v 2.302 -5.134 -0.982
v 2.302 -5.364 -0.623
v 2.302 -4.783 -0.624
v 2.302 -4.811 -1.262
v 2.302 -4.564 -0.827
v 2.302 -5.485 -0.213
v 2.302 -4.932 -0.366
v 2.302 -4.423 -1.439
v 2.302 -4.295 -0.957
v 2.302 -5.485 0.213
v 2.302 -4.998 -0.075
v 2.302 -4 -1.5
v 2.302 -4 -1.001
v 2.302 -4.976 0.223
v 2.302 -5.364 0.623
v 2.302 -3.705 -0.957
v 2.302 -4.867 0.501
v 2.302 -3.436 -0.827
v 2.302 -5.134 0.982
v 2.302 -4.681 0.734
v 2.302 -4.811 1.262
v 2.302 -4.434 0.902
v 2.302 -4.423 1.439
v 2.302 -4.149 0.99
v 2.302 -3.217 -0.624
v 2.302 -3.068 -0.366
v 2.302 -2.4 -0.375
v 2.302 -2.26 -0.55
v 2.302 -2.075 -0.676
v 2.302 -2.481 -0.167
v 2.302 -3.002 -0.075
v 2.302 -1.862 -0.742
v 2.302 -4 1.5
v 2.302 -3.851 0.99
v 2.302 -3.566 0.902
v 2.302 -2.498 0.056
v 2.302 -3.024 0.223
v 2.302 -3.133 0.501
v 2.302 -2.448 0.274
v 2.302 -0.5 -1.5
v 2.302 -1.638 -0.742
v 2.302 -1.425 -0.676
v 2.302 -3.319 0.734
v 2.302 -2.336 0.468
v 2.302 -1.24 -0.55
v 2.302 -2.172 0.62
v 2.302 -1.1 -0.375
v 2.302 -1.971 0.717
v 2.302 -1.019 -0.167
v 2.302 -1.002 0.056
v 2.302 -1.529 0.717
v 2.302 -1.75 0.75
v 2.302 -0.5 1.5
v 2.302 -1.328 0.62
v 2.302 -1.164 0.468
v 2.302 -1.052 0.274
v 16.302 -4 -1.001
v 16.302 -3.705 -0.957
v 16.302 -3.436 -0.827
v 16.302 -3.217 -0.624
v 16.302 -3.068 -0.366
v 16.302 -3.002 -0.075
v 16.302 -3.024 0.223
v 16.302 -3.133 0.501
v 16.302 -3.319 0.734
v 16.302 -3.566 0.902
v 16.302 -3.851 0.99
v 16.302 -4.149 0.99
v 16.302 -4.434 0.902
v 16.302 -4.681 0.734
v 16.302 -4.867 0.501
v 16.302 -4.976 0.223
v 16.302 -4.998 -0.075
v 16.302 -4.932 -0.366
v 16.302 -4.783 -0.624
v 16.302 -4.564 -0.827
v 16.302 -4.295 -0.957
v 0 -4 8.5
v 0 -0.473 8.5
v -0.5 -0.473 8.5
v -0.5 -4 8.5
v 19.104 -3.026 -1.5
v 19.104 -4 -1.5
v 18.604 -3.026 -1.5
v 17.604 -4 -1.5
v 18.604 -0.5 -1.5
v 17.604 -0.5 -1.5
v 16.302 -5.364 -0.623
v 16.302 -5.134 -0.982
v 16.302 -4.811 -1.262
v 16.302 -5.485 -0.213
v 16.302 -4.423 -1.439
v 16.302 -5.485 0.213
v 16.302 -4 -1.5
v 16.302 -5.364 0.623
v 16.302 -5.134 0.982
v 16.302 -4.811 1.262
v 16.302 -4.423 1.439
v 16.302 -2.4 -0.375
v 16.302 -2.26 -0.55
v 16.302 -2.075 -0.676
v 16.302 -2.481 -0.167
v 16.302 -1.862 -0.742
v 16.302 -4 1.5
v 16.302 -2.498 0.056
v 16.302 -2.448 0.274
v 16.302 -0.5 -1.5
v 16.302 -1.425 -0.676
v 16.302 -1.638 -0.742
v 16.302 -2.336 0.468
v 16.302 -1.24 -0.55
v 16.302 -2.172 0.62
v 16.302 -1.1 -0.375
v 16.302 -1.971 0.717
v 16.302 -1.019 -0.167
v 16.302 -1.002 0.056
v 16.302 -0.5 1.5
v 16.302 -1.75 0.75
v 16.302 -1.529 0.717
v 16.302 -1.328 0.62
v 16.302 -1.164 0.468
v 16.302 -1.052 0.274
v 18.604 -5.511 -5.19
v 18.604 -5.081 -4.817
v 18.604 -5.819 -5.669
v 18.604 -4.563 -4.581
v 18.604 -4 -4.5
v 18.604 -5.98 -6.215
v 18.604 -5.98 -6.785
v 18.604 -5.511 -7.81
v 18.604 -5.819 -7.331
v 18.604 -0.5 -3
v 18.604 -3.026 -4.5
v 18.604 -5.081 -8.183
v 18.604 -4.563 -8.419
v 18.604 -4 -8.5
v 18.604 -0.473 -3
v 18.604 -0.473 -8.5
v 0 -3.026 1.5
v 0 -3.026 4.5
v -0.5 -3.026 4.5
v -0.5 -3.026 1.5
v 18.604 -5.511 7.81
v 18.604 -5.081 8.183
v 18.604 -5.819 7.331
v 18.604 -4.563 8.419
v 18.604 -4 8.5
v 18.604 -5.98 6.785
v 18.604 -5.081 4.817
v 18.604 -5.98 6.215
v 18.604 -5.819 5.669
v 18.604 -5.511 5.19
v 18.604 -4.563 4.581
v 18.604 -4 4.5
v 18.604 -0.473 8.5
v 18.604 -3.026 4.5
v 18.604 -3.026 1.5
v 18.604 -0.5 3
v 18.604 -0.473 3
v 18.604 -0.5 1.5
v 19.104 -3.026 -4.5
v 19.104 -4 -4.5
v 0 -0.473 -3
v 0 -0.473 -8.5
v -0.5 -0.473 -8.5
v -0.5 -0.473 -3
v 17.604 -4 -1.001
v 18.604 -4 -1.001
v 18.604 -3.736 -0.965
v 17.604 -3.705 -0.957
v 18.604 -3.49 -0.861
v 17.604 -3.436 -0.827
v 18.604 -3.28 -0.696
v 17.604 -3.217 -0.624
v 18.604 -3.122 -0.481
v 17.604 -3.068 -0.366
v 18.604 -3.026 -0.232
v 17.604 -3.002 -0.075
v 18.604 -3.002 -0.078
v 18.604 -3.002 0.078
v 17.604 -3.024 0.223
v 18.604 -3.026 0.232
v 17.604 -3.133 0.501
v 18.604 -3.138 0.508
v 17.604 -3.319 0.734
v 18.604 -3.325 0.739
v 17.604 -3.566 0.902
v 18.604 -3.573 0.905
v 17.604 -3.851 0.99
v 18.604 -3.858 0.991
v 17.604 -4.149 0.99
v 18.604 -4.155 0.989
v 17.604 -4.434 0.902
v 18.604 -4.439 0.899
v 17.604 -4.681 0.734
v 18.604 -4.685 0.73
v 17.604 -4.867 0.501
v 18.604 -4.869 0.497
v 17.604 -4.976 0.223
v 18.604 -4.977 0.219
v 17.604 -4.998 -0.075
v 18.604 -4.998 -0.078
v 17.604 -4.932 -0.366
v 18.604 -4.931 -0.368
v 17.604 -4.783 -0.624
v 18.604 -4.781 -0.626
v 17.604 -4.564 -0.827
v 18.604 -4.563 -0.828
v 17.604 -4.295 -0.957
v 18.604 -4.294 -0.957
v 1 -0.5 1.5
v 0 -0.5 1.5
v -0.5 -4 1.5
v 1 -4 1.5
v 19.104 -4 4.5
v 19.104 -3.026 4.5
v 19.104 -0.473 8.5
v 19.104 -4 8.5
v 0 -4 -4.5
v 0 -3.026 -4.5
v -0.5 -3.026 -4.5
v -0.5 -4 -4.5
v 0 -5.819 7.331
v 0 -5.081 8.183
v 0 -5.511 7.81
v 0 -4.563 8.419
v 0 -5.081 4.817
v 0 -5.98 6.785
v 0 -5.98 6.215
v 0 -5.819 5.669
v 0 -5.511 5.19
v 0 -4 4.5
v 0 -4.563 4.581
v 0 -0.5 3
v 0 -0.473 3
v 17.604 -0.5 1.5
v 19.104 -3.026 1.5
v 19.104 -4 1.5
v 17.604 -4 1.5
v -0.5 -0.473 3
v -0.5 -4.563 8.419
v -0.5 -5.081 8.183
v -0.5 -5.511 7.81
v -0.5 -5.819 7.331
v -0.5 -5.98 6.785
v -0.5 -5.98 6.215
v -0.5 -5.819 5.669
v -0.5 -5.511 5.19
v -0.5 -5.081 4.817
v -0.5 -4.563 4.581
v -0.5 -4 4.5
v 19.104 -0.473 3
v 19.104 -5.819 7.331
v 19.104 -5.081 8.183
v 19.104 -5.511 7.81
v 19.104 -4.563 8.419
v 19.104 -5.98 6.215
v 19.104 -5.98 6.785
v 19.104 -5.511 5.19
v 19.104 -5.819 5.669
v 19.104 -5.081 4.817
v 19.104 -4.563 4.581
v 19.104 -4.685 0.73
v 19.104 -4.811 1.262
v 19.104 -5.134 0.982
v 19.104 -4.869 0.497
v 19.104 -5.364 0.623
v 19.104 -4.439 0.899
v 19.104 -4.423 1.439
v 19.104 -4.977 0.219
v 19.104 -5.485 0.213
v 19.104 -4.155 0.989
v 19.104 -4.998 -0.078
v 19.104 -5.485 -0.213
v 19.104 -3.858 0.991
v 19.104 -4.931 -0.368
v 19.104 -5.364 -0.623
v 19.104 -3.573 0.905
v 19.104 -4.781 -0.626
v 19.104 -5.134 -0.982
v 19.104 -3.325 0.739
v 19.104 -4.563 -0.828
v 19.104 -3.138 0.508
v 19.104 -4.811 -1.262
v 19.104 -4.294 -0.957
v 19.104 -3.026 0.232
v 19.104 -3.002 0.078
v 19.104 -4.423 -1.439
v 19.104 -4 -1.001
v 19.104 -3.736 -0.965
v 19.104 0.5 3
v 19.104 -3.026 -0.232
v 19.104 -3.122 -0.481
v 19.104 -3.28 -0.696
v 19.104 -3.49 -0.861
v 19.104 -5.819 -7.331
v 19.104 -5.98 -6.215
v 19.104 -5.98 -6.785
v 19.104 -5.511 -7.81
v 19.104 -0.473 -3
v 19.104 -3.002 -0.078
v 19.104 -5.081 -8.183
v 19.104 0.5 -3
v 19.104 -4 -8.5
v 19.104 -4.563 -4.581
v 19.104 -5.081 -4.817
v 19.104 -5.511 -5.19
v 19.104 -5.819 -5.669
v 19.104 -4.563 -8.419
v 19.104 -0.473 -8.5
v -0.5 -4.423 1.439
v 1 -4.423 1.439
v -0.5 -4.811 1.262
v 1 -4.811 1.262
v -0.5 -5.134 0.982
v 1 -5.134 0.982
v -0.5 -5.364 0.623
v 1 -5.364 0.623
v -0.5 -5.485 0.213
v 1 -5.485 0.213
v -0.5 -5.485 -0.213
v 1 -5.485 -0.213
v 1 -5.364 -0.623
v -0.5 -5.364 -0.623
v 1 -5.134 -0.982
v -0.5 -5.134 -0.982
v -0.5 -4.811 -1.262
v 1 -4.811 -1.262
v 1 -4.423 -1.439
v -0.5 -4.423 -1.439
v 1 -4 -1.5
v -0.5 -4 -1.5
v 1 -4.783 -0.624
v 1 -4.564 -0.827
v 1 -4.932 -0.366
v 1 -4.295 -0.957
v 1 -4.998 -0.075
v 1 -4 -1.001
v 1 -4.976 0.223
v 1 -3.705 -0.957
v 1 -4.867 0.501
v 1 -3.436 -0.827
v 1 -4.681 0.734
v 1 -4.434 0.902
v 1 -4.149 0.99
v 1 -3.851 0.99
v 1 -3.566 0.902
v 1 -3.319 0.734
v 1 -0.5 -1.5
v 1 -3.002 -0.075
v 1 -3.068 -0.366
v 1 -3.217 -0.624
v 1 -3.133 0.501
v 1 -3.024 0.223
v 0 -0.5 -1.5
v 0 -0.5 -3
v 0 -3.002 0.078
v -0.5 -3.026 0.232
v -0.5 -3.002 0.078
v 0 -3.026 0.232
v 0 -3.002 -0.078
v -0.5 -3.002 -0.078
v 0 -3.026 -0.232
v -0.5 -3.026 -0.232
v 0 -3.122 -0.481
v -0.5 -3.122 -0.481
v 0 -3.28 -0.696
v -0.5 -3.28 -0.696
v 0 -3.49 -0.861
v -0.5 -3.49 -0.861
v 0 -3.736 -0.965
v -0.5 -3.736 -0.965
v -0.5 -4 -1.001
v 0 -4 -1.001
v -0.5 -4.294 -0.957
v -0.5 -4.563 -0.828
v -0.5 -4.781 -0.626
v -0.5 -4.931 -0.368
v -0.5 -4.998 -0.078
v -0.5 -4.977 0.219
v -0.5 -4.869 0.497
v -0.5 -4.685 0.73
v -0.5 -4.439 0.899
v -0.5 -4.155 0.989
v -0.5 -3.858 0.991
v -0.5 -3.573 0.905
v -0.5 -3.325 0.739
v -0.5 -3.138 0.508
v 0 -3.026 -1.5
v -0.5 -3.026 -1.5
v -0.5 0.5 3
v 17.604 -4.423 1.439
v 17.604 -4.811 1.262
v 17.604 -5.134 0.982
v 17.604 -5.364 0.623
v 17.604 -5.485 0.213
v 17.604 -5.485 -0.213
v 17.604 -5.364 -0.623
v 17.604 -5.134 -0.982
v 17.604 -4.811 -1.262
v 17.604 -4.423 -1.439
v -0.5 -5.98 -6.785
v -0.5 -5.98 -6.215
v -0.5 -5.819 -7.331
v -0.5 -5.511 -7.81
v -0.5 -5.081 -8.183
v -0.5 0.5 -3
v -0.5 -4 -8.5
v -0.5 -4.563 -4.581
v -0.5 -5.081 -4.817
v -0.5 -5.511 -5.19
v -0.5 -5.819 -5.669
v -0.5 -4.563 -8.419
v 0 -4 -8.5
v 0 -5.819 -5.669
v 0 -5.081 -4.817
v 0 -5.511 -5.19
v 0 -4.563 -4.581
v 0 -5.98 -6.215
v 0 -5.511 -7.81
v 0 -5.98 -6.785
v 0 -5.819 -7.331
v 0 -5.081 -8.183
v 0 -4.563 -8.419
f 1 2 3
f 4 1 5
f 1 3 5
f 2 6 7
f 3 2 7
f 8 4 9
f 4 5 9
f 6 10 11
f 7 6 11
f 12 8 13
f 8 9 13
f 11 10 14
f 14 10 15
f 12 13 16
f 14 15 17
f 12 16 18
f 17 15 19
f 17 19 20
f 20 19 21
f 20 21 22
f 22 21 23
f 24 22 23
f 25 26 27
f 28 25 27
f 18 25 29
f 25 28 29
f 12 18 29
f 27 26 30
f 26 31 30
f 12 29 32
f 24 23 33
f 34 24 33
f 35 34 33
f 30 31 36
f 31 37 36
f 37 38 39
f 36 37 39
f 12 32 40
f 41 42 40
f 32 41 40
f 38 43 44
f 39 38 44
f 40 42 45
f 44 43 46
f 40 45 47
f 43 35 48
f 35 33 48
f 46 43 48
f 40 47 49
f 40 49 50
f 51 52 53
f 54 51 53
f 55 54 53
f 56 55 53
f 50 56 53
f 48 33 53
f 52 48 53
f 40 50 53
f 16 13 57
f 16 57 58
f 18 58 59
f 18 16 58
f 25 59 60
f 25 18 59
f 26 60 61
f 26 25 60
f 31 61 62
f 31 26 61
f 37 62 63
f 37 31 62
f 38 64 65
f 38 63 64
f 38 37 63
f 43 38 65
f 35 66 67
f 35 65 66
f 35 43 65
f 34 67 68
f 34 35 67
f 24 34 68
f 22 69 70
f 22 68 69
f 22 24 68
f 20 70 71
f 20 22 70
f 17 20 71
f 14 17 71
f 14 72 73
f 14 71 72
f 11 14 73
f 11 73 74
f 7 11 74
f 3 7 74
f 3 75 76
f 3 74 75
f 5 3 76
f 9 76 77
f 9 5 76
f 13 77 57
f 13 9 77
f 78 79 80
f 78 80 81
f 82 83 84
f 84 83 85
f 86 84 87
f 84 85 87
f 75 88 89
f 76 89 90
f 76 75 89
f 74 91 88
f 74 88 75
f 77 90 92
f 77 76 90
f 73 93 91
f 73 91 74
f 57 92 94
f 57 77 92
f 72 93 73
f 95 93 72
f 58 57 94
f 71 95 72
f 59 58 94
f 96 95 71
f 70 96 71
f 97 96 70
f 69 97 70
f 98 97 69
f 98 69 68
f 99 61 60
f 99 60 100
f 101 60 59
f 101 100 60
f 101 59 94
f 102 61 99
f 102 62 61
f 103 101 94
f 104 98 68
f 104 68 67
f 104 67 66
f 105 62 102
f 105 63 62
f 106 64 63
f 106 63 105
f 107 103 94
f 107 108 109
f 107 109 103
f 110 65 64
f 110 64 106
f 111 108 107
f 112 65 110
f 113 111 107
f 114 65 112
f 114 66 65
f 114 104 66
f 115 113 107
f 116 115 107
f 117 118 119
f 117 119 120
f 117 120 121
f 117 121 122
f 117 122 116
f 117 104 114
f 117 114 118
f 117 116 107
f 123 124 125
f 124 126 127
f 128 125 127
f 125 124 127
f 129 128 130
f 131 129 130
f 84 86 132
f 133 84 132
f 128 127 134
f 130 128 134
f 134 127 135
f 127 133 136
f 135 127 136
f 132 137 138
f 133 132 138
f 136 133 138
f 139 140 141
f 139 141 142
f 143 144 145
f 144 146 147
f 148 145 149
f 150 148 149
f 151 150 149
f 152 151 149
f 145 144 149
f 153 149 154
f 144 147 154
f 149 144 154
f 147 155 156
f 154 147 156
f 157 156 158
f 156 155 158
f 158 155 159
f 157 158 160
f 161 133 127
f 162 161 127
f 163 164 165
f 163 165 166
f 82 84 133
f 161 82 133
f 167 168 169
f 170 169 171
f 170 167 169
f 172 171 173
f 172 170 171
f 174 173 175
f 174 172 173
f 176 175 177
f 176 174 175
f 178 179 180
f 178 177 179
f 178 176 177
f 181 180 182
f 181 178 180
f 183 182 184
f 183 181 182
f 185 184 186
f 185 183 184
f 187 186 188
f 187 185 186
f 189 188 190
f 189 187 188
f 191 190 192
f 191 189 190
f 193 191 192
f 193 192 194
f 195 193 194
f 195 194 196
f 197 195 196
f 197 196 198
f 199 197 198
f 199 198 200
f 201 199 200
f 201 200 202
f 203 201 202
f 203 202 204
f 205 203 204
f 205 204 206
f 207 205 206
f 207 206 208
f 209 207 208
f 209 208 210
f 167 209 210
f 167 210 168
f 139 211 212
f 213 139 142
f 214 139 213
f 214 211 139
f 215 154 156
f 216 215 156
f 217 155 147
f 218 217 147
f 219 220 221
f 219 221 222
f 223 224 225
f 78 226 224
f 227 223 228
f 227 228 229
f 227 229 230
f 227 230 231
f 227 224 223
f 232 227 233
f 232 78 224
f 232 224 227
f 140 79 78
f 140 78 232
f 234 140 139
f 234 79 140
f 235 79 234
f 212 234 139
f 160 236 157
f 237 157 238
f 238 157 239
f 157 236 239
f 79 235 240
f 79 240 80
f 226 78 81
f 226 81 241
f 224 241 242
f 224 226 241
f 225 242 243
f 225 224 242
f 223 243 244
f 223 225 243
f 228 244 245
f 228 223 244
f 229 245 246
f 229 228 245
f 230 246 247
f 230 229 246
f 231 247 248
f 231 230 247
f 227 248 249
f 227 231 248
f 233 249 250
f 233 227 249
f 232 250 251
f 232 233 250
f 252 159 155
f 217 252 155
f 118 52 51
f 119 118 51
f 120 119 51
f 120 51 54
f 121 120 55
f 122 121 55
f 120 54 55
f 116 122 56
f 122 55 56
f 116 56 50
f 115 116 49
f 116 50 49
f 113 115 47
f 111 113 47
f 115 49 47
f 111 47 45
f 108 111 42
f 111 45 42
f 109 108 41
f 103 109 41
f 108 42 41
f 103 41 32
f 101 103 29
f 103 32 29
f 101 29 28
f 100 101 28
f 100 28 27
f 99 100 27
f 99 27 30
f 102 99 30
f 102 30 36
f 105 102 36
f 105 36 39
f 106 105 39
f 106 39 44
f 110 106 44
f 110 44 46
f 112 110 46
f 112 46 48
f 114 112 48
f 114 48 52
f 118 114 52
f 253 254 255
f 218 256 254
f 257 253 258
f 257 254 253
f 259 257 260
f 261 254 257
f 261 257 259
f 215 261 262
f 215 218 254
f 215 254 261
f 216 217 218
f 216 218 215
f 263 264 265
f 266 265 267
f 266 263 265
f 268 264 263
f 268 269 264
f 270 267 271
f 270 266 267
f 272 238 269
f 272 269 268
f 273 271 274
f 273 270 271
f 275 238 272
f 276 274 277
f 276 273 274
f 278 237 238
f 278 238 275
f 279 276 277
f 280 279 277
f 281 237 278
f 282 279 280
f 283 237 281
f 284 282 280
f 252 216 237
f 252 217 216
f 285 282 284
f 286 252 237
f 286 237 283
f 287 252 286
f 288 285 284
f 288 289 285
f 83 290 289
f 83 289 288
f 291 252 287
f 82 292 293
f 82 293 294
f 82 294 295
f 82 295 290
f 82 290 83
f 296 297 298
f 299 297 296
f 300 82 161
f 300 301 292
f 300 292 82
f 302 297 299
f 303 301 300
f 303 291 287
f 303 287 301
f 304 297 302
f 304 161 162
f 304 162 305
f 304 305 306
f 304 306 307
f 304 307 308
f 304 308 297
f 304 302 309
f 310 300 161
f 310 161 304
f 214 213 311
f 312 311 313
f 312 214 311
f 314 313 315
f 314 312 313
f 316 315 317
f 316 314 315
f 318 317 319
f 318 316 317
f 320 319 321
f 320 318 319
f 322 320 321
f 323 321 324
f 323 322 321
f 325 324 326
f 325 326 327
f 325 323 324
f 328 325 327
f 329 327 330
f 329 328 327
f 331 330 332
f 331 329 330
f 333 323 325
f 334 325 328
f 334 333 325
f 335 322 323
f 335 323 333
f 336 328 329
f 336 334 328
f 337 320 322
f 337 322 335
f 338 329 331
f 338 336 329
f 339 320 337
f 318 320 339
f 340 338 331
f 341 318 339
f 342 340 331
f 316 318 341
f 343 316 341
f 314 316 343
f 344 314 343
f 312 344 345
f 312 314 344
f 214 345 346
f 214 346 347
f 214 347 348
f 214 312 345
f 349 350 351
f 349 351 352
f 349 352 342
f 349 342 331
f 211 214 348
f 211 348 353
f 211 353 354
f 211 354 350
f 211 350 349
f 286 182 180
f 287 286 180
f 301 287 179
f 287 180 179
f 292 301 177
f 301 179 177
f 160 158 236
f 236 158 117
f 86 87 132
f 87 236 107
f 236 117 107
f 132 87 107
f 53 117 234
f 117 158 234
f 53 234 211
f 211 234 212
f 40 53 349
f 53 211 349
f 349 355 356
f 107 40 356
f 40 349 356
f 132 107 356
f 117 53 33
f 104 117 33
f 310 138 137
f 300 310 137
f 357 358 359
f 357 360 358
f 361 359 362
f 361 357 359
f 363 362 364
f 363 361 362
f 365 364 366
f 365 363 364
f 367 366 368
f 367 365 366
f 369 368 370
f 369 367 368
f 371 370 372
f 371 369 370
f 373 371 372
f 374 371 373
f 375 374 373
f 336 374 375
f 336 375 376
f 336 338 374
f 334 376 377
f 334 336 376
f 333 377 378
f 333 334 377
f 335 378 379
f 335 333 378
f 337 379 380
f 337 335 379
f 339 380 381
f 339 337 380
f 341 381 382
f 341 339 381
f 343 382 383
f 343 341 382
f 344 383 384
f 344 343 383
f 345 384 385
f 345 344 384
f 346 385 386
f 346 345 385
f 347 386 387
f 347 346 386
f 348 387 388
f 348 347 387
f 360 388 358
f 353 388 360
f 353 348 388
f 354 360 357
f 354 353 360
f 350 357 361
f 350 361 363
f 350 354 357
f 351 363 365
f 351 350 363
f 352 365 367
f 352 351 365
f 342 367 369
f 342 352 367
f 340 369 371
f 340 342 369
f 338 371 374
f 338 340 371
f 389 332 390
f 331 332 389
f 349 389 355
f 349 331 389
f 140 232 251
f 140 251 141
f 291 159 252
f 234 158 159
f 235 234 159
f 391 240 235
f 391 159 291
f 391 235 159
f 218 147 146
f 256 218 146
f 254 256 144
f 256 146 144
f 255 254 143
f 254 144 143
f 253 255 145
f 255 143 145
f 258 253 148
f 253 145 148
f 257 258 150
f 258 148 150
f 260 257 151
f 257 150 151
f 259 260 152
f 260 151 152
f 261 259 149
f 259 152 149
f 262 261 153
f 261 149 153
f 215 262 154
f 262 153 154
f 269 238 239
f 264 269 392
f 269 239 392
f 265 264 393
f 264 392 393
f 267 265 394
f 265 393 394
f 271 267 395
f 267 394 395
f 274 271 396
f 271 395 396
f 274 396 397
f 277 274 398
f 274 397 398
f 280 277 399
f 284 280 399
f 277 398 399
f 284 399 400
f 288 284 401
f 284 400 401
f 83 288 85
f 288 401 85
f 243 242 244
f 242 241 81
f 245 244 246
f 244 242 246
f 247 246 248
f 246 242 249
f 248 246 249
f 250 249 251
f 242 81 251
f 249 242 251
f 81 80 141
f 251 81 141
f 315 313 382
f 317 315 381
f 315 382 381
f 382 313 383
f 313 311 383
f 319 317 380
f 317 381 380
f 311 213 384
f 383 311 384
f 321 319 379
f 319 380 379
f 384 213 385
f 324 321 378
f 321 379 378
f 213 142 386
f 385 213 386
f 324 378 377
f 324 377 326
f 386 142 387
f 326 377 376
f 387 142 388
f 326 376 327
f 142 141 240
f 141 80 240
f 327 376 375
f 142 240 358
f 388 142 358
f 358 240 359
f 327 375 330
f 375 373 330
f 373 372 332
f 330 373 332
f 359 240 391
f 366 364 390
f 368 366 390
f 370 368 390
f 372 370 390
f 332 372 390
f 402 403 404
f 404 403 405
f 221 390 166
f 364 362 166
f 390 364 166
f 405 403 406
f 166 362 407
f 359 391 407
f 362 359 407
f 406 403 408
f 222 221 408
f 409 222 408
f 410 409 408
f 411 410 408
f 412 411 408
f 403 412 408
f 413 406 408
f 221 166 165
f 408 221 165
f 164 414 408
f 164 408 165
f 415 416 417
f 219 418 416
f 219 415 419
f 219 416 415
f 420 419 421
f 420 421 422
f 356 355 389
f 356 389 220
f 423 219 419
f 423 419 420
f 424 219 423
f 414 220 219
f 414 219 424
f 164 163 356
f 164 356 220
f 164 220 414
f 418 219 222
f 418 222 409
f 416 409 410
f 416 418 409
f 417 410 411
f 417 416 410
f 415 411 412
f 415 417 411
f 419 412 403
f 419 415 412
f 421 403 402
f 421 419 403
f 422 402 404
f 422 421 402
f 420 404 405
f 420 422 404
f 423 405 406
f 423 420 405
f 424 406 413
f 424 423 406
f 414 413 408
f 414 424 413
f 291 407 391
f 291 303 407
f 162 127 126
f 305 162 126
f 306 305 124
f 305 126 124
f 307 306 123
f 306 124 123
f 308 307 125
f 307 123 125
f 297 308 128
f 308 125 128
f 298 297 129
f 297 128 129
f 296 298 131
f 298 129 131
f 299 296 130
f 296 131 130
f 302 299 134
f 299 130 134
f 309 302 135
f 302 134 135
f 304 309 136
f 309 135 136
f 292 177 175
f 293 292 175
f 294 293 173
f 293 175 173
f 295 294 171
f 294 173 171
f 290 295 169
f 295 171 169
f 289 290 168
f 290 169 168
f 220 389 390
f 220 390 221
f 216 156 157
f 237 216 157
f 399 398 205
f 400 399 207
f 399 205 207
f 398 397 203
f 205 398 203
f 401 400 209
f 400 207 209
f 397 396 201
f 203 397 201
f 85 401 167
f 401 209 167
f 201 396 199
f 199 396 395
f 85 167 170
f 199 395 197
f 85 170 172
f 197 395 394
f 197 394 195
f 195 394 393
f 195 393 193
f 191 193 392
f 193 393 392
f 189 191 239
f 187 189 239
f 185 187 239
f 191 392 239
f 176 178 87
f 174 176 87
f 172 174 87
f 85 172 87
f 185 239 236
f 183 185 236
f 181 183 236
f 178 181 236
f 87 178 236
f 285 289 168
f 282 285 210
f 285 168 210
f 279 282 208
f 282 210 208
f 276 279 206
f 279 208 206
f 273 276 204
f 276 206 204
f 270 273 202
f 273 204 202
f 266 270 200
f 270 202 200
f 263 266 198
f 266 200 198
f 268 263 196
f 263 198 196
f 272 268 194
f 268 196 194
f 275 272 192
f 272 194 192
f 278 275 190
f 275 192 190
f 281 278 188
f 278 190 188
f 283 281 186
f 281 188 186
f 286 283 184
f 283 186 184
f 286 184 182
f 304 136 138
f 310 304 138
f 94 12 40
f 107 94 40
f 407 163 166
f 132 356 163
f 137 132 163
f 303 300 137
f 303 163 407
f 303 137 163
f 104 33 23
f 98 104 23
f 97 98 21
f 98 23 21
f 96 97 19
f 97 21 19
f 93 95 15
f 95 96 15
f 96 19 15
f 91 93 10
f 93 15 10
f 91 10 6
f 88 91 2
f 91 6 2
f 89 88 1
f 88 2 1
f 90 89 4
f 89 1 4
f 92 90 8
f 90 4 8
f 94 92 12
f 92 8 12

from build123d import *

# Parameters (mm, degrees)
SKETCH1_R           = 1.001
SKETCH1_W           = 6
SKETCH1_H           = 1
BOSS_EXTRUDE1_DEPTH = 18.604
CUT_EXTRUDE1_REACH  = 8
SKETCH2_W           = 1.302
SKETCH2_H           = 5.804323037
SKETCH2_H_2         = 5.909581117
CUT_EXTRUDE2_REACH  = 18.302
SKETCH3_R           = 0.75
BOSS_EXTRUDE2_DEPTH = 0.5


with BuildPart() as part:
    # Sketch1 → Boss-Extrude1 (new body)
    with BuildSketch(Plane(origin=(0, 0, 0), x_dir=(0, 0, -1), z_dir=(1, 0, 0))):
        with BuildLine():
            Line((1.5, -4), (1.5, -0.5))
            Line((1.5, -0.5), (-1.5, -0.5))
            Line((-1.5, -0.5), (-1.5, -4))
            ThreePointArc((-1.5, -4), (0, -5.5), (1.5, -4))
        make_face()
        with Locations((0, -4)):
            Circle(SKETCH1_R, mode=Mode.SUBTRACT)
        Rectangle(SKETCH1_W, SKETCH1_H)
    extrude(amount=BOSS_EXTRUDE1_DEPTH)

    # Sketch2 → Cut-Extrude1 (cut, up to next)
    with BuildSketch(Plane.XY.offset(3), mode=Mode.PRIVATE) as cut_extrude1_sk1:
        with Locations((1.651, -3.402161519)):
            Rectangle(SKETCH2_W, SKETCH2_H)
    cut_extrude1_tool1 = extrude(cut_extrude1_sk1.sketch, amount=-CUT_EXTRUDE1_REACH, mode=Mode.PRIVATE) & part.part
    add(cut_extrude1_tool1.solids().sort_by_distance((1.651, -3.402162, 3))[0], mode=Mode.SUBTRACT)
    # Sketch2 → Cut-Extrude1 (cut, up to next)
    with BuildSketch(Plane.XY.offset(3), mode=Mode.PRIVATE) as cut_extrude1_sk2:
        with Locations((16.953, -3.454790559)):
            Rectangle(SKETCH2_W, SKETCH2_H_2)
    cut_extrude1_tool2 = extrude(cut_extrude1_sk2.sketch, amount=-CUT_EXTRUDE1_REACH, mode=Mode.PRIVATE) & part.part
    add(cut_extrude1_tool2.solids().sort_by_distance((16.953, -3.454791, 3))[0], mode=Mode.SUBTRACT)

    # Sketch3 → Cut-Extrude2 (cut, up to next)
    with BuildSketch(Plane.ZY.offset(-2.302), mode=Mode.PRIVATE) as cut_extrude2_sk1:
        with Locations((0, -1.75)):
            Circle(SKETCH3_R)
    cut_extrude2_tool1 = extrude(cut_extrude2_sk1.sketch, amount=-CUT_EXTRUDE2_REACH, mode=Mode.PRIVATE) & part.part
    add(cut_extrude2_tool1.solids().sort_by_distance((2.302, -1.75, 0))[0], mode=Mode.SUBTRACT)

    # Sketch4 → Boss-Extrude2 (add)
    with BuildSketch(Plane(origin=(18.604, 0, 0), x_dir=(0, 0, -1), z_dir=(1, 0, 0))):
        with BuildLine():
            Line((-4.5, -4), (-4.5, -3.026257348))
            Line((-4.5, -3.026257348), (-1.5, -3.026257348))
            Line((-1.5, -3.026257348), (-1.5, -4))
            ThreePointArc((-1.5, -4), (0, -5.5), (1.5, -4))
            Line((1.5, -4), (1.5, -3.026257348))
            Line((1.5, -3.026257348), (4.5, -3.026257348))
            Line((4.5, -3.026257348), (4.5, -4))
            ThreePointArc((4.5, -4), (6.5, -6), (8.5, -4))
            Line((8.5, -4), (8.5, -3.026257348))
            Line((8.5, -3.026257348), (8.5, -0.472742652))
            Line((8.5, -0.472742652), (3, -0.472742652))
            Line((3, -0.472742652), (3, 0.5))
            Line((3, 0.5), (-3, 0.5))
            Line((-3, 0.5), (-3, -0.472742652))
            Line((-3, -0.472742652), (-8.5, -0.472742652))
            Line((-8.5, -0.472742652), (-8.5, -3.026257348))
            Line((-8.5, -3.026257348), (-8.5, -4))
            ThreePointArc((-8.5, -4), (-6.5, -6), (-4.5, -4))
        make_face()
        with BuildLine():
            ThreePointArc((1.001, -4), (-0.620388649, -4.785569173), (-0.232004845, -3.026257348))
            ThreePointArc((-0.232004845, -3.026257348), (0, -2.999), (0.232004845, -3.026257348))
            ThreePointArc((0.232004845, -3.026257348), (0.785569173, -3.379611351), (1.001, -4))
        make_face(mode=Mode.SUBTRACT)
    boss_extrude2 = extrude(amount=BOSS_EXTRUDE2_DEPTH)

    # Mirror2: Boss-Extrude2 across plane
    add(boss_extrude2.mirror(Plane.ZY.offset(-9.302)))


solid = part.part
